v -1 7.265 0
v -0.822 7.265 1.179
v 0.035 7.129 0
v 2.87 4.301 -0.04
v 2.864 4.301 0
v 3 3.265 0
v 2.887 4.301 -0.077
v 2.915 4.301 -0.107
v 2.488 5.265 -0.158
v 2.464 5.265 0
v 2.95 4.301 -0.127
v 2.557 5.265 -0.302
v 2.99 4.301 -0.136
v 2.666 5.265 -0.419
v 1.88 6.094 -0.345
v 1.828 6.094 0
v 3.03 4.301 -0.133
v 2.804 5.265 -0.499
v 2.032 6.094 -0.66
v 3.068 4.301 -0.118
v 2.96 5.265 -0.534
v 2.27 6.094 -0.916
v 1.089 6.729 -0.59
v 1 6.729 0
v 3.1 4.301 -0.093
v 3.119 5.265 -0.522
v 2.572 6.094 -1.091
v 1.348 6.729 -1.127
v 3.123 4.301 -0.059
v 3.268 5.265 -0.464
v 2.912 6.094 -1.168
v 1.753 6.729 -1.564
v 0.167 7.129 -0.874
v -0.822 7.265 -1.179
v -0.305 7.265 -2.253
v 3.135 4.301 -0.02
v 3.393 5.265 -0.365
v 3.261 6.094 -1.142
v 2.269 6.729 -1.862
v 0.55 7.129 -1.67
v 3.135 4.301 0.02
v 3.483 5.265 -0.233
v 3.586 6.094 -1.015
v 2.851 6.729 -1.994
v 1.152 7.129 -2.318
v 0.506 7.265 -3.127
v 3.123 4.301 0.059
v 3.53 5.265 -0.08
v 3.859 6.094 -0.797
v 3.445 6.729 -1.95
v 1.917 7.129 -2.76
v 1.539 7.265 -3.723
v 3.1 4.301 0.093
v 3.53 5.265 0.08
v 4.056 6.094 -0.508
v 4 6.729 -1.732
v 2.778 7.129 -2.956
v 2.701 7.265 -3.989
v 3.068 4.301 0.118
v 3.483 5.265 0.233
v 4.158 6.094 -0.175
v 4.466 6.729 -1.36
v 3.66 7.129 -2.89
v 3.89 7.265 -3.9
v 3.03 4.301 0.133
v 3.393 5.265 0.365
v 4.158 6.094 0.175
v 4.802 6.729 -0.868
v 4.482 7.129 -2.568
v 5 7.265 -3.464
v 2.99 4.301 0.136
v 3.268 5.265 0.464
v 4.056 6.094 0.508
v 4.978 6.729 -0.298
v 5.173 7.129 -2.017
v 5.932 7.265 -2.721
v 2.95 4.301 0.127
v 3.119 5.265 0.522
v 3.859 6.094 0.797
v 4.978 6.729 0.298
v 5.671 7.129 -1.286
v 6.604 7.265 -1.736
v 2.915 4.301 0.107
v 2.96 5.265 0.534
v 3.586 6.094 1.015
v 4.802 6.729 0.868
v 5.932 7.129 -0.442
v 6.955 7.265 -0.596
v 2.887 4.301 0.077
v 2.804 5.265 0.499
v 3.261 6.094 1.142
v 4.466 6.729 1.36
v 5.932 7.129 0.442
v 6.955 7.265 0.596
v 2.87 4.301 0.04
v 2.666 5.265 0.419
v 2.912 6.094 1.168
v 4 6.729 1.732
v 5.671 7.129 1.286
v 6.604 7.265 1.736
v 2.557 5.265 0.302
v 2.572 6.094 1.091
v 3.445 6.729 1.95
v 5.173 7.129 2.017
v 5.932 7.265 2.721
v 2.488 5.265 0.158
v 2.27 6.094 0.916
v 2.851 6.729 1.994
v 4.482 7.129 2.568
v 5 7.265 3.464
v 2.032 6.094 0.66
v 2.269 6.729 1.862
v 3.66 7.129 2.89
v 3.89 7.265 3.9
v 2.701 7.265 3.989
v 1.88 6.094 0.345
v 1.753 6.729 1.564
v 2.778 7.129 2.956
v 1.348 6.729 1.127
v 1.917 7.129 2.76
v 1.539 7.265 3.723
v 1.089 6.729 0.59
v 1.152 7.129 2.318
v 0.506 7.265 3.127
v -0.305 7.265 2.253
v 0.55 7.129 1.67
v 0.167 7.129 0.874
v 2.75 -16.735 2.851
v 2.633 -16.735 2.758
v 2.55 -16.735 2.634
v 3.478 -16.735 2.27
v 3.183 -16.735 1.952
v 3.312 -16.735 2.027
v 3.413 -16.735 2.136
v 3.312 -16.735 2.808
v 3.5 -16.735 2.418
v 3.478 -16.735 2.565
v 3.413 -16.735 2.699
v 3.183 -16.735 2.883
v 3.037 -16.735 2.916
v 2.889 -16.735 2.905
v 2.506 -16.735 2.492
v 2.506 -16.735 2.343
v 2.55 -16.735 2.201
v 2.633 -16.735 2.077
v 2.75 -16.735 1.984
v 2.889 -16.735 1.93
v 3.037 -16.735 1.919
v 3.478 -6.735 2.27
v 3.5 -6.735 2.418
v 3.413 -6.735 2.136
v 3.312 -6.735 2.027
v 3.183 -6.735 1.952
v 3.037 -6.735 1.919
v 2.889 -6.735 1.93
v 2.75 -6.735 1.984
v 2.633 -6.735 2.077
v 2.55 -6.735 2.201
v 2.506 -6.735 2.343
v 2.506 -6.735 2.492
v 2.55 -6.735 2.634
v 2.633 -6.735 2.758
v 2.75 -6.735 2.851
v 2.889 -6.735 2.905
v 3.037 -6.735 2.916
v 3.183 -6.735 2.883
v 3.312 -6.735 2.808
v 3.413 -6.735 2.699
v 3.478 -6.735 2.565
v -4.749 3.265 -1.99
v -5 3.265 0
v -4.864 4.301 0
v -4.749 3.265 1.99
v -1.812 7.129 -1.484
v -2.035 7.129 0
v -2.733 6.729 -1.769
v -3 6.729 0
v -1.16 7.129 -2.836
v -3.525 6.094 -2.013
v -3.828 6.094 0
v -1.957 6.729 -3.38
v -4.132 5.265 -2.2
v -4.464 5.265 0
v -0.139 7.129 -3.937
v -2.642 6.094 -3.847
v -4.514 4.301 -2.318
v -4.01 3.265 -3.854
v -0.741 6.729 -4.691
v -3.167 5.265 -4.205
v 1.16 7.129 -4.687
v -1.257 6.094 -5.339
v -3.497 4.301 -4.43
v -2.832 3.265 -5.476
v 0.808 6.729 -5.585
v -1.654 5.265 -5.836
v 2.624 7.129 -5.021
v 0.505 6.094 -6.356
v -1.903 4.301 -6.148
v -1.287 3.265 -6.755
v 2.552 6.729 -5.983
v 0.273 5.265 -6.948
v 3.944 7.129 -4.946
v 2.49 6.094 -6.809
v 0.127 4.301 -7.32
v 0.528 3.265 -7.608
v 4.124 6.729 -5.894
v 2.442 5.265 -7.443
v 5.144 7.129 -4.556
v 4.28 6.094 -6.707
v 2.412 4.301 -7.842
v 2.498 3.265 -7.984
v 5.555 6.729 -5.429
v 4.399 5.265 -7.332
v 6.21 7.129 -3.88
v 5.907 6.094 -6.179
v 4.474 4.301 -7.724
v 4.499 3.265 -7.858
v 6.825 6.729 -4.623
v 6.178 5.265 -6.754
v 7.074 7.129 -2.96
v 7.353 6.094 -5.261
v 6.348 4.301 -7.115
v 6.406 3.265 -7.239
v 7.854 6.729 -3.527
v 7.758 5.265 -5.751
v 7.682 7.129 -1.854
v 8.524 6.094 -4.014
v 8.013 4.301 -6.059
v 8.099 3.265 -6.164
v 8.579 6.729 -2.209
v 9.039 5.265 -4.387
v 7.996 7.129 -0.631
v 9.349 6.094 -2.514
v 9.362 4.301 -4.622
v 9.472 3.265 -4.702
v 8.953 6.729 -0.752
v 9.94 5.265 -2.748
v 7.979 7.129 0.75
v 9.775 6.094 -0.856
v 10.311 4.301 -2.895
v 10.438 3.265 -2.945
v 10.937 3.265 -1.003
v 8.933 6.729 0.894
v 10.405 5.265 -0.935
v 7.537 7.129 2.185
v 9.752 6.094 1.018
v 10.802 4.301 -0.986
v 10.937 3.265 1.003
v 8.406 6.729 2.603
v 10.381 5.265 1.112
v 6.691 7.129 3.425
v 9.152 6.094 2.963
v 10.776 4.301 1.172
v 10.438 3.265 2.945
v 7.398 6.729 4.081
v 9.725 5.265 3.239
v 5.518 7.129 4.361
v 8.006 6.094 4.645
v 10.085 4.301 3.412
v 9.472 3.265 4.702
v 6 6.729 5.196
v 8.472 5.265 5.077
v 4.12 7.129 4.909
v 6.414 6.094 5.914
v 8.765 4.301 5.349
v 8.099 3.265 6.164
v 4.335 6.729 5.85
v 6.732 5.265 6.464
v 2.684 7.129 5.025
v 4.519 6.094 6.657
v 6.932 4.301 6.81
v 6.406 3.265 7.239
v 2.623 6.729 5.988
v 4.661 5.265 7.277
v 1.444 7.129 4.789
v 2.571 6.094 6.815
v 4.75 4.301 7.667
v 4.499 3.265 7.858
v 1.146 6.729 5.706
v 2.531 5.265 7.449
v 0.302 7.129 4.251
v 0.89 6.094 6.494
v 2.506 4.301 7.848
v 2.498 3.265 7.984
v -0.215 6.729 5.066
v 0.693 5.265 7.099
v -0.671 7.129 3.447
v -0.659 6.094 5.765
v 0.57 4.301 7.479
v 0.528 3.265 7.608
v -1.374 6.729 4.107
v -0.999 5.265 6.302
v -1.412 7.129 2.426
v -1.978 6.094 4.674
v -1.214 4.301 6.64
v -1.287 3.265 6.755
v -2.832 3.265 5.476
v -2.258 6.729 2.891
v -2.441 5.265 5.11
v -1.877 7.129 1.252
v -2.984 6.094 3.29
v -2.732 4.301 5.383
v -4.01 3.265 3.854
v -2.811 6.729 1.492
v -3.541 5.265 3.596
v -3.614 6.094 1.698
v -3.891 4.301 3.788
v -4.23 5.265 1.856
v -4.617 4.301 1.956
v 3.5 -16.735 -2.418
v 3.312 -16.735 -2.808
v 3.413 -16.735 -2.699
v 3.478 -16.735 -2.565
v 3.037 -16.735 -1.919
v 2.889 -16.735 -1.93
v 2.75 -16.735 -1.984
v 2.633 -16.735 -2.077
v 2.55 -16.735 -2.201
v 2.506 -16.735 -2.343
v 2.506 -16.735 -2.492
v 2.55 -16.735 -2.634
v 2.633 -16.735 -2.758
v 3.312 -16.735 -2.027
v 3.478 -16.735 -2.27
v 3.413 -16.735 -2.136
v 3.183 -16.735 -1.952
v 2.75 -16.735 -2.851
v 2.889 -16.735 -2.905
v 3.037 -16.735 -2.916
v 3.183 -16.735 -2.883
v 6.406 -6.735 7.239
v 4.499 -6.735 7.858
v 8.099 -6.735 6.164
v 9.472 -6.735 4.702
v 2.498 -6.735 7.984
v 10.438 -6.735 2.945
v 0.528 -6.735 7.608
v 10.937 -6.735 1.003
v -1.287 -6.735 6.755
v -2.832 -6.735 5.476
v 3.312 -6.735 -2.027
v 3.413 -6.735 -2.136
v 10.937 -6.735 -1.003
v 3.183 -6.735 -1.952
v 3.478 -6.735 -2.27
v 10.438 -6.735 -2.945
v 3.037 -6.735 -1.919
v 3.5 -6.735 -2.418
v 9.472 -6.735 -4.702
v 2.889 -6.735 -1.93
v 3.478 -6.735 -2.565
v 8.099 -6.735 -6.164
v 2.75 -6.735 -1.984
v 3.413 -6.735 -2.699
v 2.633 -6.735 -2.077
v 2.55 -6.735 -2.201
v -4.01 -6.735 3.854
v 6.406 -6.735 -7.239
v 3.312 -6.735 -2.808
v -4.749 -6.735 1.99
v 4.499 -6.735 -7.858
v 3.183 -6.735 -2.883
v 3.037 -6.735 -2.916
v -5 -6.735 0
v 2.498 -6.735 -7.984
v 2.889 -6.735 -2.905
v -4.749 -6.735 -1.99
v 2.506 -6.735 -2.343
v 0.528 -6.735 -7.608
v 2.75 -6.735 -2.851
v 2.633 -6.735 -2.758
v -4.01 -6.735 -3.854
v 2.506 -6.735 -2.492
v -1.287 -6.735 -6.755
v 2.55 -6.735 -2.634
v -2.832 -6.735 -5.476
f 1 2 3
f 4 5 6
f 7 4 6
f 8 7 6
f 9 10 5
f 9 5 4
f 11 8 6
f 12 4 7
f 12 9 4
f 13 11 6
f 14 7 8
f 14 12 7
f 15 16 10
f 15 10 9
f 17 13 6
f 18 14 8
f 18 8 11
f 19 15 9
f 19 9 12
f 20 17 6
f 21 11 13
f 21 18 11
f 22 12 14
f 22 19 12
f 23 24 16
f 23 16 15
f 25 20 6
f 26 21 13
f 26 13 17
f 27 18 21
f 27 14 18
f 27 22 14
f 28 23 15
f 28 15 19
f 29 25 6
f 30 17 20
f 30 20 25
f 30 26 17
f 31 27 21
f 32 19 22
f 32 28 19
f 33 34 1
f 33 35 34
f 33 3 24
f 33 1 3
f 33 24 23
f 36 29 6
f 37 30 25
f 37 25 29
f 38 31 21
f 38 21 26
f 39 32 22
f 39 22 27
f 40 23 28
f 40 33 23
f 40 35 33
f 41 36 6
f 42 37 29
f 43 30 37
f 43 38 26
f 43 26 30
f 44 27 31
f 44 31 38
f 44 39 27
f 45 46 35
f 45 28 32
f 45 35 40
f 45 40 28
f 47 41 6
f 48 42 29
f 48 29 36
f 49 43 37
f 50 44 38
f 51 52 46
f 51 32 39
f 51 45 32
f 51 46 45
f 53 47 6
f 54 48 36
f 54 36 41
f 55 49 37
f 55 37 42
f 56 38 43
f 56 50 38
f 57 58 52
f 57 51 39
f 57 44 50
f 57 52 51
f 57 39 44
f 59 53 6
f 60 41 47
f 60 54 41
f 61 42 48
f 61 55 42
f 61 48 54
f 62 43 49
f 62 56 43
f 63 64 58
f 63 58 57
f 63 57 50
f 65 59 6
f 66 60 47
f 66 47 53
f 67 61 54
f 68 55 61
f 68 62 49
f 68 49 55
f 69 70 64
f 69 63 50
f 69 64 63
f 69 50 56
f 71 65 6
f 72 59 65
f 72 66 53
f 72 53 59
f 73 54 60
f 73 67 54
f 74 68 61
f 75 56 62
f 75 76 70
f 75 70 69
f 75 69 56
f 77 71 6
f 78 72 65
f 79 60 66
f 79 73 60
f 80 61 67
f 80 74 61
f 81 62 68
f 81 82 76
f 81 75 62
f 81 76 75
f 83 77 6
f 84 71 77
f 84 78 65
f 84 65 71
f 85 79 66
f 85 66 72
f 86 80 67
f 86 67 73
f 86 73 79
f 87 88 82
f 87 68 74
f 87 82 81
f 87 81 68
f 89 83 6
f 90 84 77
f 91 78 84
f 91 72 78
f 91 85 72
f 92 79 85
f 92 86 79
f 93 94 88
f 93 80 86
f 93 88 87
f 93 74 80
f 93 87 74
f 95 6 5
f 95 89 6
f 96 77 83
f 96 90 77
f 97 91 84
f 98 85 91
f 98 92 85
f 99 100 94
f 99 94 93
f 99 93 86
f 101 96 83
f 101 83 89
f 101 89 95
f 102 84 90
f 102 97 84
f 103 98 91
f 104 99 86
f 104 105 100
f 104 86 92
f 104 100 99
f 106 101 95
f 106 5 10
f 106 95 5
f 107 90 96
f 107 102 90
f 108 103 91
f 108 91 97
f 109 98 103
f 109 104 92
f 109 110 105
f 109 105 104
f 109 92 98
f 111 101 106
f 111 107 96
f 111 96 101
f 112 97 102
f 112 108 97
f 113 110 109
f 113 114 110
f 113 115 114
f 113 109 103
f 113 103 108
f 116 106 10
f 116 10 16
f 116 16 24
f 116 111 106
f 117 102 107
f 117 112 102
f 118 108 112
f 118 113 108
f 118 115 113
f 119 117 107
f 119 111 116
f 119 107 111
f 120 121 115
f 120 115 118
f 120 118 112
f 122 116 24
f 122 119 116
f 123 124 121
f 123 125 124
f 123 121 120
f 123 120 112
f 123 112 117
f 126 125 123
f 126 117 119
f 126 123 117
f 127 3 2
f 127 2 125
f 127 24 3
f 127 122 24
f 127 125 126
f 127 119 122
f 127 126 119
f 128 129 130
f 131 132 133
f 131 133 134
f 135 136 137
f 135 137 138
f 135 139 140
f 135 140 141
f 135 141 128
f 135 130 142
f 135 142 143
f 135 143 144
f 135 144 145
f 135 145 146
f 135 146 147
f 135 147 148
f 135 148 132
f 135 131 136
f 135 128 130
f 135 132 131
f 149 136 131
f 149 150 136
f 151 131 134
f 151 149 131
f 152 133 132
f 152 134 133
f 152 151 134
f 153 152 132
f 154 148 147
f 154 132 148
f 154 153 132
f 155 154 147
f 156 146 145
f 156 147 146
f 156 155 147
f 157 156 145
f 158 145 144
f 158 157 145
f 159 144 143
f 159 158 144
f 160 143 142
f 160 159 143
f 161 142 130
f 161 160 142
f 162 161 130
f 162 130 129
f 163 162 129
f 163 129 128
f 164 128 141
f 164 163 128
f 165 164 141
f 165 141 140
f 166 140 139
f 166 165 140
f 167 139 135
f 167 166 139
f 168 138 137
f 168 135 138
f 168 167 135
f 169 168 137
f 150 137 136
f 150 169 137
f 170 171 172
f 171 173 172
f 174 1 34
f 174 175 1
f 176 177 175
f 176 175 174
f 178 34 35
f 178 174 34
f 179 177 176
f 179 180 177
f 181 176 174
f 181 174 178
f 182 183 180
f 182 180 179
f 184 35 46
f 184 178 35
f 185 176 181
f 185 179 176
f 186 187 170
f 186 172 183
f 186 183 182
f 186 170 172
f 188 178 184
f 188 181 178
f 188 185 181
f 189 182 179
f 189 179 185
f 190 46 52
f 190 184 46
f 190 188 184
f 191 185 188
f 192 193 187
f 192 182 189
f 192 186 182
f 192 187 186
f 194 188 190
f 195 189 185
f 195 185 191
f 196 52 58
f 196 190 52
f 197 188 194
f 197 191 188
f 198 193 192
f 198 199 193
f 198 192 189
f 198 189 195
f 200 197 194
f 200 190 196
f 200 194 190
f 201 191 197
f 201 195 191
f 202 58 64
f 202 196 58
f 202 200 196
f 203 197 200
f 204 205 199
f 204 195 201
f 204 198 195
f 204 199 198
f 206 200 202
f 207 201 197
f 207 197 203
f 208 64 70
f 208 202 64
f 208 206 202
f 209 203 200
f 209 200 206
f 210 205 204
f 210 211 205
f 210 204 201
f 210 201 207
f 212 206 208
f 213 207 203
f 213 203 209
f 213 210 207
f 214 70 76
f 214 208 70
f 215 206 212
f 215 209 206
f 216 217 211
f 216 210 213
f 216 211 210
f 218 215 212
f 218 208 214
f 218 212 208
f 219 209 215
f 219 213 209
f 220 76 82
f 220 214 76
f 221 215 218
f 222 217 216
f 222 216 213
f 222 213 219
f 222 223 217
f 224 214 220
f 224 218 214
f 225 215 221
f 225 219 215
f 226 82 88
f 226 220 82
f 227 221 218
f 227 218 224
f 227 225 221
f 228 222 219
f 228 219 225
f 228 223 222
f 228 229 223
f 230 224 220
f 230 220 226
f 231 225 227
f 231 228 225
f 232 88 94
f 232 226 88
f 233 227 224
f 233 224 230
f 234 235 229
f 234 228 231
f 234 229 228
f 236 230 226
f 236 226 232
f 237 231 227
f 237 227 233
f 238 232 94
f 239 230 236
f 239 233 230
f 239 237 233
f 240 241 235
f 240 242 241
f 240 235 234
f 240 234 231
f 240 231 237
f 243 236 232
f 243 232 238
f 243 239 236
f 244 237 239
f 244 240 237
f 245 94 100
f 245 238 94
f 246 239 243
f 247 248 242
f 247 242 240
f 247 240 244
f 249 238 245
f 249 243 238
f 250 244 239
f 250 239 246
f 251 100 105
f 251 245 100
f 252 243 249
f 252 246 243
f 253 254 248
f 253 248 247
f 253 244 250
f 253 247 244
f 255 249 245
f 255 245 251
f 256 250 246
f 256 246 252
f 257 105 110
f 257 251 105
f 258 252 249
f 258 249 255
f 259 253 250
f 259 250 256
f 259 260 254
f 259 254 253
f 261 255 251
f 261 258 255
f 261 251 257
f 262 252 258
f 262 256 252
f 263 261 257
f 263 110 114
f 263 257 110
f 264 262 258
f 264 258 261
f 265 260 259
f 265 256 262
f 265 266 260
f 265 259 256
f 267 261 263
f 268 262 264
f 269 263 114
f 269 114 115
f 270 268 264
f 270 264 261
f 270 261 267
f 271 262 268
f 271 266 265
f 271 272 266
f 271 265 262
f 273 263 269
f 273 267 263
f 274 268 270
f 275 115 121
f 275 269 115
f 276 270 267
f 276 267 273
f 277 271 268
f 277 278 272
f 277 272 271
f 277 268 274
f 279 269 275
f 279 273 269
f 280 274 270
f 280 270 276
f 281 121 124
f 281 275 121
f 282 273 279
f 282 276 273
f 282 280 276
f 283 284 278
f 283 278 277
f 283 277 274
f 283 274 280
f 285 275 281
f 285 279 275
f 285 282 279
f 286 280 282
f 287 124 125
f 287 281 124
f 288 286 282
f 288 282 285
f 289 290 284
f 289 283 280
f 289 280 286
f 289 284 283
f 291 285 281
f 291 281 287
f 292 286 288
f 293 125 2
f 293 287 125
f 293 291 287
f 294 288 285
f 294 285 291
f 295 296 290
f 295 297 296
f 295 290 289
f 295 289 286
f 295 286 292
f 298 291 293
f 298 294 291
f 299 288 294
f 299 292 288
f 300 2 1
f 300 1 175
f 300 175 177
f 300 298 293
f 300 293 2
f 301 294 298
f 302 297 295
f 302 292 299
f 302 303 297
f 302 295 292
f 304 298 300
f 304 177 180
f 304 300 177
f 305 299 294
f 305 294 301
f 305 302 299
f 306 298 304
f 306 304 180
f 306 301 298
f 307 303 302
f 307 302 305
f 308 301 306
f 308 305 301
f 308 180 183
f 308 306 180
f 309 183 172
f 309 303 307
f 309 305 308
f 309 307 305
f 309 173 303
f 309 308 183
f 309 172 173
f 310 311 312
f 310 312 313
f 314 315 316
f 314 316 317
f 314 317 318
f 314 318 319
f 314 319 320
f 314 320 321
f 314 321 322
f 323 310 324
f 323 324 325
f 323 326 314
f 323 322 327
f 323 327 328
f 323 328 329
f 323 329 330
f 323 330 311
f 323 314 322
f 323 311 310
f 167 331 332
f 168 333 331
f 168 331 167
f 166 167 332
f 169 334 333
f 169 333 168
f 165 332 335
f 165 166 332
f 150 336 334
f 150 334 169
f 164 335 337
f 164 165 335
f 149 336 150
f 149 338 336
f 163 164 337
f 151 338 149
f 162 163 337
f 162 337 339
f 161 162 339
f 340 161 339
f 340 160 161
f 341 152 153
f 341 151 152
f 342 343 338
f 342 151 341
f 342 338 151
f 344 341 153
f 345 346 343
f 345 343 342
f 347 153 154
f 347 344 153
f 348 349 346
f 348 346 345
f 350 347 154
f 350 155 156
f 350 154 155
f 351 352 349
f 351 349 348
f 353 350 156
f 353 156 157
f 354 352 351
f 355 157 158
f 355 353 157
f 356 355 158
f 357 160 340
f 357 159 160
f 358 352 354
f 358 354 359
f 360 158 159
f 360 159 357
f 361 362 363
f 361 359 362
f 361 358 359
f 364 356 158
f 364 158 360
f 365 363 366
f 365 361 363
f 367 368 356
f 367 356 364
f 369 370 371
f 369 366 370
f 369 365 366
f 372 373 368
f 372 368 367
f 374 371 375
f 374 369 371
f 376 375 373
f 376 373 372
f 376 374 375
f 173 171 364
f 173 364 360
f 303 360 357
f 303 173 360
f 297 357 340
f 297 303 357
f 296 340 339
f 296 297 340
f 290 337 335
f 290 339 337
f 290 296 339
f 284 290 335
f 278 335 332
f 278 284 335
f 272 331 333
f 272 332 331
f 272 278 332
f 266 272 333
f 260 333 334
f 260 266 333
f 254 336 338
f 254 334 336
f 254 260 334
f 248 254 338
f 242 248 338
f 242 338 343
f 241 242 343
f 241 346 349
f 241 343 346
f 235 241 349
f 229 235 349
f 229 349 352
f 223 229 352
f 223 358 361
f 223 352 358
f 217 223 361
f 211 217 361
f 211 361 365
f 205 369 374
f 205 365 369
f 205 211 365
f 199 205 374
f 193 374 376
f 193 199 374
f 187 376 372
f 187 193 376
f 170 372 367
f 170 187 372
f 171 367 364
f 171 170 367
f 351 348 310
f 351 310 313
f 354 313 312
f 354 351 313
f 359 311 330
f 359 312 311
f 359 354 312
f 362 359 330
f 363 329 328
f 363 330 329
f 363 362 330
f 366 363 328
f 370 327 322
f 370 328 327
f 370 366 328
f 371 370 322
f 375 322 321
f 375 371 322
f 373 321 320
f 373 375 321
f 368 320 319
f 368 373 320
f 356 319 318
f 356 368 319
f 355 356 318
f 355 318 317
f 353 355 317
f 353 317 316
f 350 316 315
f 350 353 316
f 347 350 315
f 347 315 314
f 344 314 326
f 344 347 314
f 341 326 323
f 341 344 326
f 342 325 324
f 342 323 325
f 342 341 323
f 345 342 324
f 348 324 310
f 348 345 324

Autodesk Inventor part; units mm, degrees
ref_plane "YZ Plane" through (0, 0, 0) normal (1, 0, 0) x (0, 1, 0)
ref_plane "XZ Plane" through (0, 0, 0) normal (0, 1, 0) x (-1, 0, 0)
ref_plane "XY Plane" through (0, 0, 0) normal (0, 0, 1) x (1, 0, 0)
sketch "Sketch1" plane through (0, 0, 0) normal (0, 0, 1) x (1, 0, 0)
  line L0 (3, -6.7347) -> (-5, -6.7347)
  line L1 (-5, -6.7347) -> (-5, 3.2653)
  line L2 (-1, 7.2653) -> (-1, 7.2653)
  line L3 (3, 3.2653) -> (3, -6.7347)
  arc A0 (3, 3.2653) -> (-1, 7.2653) centre (-1, 3.2653) ccw
  arc A1 (-1, 7.2653) -> (-5, 3.2653) centre (-1, 3.2653) ccw
  point P0 (0, 0)
  point P1 (-5, 7.2653)
  point P2 (3, 7.2653)
  point P3 (-1, 7.2653)
  dimension "d0" = 8
  dimension "d1" = 14
  dimension "d2" = 4
revolve "Revolution1" add sketch "Sketch1" angle 360 about axis through (3, 3.2653, 0) along (0, -1, 0)
sketch "Sketch2" plane through (3, -6.7347, 0) normal (0, -1, 0) x (1, 0, 0)
  circle A0 centre (0, 2.4175) radius 0.5
  circle A1 centre (0, -2.4175) radius 0.5
  point P0 (-3, 0)
  dimension "d4" = 1
  dimension "d5" = 1
  dimension "d8" = 4.8351
sketch "Sketch3" plane through (3, -6.7347, 0) normal (0, -1, 0) x (1, 0, 0)
  point P0 (-3, 0)
extrude "Extrusion1" add sketch "Sketch2" along normal blind 10
properties part number "LED"
